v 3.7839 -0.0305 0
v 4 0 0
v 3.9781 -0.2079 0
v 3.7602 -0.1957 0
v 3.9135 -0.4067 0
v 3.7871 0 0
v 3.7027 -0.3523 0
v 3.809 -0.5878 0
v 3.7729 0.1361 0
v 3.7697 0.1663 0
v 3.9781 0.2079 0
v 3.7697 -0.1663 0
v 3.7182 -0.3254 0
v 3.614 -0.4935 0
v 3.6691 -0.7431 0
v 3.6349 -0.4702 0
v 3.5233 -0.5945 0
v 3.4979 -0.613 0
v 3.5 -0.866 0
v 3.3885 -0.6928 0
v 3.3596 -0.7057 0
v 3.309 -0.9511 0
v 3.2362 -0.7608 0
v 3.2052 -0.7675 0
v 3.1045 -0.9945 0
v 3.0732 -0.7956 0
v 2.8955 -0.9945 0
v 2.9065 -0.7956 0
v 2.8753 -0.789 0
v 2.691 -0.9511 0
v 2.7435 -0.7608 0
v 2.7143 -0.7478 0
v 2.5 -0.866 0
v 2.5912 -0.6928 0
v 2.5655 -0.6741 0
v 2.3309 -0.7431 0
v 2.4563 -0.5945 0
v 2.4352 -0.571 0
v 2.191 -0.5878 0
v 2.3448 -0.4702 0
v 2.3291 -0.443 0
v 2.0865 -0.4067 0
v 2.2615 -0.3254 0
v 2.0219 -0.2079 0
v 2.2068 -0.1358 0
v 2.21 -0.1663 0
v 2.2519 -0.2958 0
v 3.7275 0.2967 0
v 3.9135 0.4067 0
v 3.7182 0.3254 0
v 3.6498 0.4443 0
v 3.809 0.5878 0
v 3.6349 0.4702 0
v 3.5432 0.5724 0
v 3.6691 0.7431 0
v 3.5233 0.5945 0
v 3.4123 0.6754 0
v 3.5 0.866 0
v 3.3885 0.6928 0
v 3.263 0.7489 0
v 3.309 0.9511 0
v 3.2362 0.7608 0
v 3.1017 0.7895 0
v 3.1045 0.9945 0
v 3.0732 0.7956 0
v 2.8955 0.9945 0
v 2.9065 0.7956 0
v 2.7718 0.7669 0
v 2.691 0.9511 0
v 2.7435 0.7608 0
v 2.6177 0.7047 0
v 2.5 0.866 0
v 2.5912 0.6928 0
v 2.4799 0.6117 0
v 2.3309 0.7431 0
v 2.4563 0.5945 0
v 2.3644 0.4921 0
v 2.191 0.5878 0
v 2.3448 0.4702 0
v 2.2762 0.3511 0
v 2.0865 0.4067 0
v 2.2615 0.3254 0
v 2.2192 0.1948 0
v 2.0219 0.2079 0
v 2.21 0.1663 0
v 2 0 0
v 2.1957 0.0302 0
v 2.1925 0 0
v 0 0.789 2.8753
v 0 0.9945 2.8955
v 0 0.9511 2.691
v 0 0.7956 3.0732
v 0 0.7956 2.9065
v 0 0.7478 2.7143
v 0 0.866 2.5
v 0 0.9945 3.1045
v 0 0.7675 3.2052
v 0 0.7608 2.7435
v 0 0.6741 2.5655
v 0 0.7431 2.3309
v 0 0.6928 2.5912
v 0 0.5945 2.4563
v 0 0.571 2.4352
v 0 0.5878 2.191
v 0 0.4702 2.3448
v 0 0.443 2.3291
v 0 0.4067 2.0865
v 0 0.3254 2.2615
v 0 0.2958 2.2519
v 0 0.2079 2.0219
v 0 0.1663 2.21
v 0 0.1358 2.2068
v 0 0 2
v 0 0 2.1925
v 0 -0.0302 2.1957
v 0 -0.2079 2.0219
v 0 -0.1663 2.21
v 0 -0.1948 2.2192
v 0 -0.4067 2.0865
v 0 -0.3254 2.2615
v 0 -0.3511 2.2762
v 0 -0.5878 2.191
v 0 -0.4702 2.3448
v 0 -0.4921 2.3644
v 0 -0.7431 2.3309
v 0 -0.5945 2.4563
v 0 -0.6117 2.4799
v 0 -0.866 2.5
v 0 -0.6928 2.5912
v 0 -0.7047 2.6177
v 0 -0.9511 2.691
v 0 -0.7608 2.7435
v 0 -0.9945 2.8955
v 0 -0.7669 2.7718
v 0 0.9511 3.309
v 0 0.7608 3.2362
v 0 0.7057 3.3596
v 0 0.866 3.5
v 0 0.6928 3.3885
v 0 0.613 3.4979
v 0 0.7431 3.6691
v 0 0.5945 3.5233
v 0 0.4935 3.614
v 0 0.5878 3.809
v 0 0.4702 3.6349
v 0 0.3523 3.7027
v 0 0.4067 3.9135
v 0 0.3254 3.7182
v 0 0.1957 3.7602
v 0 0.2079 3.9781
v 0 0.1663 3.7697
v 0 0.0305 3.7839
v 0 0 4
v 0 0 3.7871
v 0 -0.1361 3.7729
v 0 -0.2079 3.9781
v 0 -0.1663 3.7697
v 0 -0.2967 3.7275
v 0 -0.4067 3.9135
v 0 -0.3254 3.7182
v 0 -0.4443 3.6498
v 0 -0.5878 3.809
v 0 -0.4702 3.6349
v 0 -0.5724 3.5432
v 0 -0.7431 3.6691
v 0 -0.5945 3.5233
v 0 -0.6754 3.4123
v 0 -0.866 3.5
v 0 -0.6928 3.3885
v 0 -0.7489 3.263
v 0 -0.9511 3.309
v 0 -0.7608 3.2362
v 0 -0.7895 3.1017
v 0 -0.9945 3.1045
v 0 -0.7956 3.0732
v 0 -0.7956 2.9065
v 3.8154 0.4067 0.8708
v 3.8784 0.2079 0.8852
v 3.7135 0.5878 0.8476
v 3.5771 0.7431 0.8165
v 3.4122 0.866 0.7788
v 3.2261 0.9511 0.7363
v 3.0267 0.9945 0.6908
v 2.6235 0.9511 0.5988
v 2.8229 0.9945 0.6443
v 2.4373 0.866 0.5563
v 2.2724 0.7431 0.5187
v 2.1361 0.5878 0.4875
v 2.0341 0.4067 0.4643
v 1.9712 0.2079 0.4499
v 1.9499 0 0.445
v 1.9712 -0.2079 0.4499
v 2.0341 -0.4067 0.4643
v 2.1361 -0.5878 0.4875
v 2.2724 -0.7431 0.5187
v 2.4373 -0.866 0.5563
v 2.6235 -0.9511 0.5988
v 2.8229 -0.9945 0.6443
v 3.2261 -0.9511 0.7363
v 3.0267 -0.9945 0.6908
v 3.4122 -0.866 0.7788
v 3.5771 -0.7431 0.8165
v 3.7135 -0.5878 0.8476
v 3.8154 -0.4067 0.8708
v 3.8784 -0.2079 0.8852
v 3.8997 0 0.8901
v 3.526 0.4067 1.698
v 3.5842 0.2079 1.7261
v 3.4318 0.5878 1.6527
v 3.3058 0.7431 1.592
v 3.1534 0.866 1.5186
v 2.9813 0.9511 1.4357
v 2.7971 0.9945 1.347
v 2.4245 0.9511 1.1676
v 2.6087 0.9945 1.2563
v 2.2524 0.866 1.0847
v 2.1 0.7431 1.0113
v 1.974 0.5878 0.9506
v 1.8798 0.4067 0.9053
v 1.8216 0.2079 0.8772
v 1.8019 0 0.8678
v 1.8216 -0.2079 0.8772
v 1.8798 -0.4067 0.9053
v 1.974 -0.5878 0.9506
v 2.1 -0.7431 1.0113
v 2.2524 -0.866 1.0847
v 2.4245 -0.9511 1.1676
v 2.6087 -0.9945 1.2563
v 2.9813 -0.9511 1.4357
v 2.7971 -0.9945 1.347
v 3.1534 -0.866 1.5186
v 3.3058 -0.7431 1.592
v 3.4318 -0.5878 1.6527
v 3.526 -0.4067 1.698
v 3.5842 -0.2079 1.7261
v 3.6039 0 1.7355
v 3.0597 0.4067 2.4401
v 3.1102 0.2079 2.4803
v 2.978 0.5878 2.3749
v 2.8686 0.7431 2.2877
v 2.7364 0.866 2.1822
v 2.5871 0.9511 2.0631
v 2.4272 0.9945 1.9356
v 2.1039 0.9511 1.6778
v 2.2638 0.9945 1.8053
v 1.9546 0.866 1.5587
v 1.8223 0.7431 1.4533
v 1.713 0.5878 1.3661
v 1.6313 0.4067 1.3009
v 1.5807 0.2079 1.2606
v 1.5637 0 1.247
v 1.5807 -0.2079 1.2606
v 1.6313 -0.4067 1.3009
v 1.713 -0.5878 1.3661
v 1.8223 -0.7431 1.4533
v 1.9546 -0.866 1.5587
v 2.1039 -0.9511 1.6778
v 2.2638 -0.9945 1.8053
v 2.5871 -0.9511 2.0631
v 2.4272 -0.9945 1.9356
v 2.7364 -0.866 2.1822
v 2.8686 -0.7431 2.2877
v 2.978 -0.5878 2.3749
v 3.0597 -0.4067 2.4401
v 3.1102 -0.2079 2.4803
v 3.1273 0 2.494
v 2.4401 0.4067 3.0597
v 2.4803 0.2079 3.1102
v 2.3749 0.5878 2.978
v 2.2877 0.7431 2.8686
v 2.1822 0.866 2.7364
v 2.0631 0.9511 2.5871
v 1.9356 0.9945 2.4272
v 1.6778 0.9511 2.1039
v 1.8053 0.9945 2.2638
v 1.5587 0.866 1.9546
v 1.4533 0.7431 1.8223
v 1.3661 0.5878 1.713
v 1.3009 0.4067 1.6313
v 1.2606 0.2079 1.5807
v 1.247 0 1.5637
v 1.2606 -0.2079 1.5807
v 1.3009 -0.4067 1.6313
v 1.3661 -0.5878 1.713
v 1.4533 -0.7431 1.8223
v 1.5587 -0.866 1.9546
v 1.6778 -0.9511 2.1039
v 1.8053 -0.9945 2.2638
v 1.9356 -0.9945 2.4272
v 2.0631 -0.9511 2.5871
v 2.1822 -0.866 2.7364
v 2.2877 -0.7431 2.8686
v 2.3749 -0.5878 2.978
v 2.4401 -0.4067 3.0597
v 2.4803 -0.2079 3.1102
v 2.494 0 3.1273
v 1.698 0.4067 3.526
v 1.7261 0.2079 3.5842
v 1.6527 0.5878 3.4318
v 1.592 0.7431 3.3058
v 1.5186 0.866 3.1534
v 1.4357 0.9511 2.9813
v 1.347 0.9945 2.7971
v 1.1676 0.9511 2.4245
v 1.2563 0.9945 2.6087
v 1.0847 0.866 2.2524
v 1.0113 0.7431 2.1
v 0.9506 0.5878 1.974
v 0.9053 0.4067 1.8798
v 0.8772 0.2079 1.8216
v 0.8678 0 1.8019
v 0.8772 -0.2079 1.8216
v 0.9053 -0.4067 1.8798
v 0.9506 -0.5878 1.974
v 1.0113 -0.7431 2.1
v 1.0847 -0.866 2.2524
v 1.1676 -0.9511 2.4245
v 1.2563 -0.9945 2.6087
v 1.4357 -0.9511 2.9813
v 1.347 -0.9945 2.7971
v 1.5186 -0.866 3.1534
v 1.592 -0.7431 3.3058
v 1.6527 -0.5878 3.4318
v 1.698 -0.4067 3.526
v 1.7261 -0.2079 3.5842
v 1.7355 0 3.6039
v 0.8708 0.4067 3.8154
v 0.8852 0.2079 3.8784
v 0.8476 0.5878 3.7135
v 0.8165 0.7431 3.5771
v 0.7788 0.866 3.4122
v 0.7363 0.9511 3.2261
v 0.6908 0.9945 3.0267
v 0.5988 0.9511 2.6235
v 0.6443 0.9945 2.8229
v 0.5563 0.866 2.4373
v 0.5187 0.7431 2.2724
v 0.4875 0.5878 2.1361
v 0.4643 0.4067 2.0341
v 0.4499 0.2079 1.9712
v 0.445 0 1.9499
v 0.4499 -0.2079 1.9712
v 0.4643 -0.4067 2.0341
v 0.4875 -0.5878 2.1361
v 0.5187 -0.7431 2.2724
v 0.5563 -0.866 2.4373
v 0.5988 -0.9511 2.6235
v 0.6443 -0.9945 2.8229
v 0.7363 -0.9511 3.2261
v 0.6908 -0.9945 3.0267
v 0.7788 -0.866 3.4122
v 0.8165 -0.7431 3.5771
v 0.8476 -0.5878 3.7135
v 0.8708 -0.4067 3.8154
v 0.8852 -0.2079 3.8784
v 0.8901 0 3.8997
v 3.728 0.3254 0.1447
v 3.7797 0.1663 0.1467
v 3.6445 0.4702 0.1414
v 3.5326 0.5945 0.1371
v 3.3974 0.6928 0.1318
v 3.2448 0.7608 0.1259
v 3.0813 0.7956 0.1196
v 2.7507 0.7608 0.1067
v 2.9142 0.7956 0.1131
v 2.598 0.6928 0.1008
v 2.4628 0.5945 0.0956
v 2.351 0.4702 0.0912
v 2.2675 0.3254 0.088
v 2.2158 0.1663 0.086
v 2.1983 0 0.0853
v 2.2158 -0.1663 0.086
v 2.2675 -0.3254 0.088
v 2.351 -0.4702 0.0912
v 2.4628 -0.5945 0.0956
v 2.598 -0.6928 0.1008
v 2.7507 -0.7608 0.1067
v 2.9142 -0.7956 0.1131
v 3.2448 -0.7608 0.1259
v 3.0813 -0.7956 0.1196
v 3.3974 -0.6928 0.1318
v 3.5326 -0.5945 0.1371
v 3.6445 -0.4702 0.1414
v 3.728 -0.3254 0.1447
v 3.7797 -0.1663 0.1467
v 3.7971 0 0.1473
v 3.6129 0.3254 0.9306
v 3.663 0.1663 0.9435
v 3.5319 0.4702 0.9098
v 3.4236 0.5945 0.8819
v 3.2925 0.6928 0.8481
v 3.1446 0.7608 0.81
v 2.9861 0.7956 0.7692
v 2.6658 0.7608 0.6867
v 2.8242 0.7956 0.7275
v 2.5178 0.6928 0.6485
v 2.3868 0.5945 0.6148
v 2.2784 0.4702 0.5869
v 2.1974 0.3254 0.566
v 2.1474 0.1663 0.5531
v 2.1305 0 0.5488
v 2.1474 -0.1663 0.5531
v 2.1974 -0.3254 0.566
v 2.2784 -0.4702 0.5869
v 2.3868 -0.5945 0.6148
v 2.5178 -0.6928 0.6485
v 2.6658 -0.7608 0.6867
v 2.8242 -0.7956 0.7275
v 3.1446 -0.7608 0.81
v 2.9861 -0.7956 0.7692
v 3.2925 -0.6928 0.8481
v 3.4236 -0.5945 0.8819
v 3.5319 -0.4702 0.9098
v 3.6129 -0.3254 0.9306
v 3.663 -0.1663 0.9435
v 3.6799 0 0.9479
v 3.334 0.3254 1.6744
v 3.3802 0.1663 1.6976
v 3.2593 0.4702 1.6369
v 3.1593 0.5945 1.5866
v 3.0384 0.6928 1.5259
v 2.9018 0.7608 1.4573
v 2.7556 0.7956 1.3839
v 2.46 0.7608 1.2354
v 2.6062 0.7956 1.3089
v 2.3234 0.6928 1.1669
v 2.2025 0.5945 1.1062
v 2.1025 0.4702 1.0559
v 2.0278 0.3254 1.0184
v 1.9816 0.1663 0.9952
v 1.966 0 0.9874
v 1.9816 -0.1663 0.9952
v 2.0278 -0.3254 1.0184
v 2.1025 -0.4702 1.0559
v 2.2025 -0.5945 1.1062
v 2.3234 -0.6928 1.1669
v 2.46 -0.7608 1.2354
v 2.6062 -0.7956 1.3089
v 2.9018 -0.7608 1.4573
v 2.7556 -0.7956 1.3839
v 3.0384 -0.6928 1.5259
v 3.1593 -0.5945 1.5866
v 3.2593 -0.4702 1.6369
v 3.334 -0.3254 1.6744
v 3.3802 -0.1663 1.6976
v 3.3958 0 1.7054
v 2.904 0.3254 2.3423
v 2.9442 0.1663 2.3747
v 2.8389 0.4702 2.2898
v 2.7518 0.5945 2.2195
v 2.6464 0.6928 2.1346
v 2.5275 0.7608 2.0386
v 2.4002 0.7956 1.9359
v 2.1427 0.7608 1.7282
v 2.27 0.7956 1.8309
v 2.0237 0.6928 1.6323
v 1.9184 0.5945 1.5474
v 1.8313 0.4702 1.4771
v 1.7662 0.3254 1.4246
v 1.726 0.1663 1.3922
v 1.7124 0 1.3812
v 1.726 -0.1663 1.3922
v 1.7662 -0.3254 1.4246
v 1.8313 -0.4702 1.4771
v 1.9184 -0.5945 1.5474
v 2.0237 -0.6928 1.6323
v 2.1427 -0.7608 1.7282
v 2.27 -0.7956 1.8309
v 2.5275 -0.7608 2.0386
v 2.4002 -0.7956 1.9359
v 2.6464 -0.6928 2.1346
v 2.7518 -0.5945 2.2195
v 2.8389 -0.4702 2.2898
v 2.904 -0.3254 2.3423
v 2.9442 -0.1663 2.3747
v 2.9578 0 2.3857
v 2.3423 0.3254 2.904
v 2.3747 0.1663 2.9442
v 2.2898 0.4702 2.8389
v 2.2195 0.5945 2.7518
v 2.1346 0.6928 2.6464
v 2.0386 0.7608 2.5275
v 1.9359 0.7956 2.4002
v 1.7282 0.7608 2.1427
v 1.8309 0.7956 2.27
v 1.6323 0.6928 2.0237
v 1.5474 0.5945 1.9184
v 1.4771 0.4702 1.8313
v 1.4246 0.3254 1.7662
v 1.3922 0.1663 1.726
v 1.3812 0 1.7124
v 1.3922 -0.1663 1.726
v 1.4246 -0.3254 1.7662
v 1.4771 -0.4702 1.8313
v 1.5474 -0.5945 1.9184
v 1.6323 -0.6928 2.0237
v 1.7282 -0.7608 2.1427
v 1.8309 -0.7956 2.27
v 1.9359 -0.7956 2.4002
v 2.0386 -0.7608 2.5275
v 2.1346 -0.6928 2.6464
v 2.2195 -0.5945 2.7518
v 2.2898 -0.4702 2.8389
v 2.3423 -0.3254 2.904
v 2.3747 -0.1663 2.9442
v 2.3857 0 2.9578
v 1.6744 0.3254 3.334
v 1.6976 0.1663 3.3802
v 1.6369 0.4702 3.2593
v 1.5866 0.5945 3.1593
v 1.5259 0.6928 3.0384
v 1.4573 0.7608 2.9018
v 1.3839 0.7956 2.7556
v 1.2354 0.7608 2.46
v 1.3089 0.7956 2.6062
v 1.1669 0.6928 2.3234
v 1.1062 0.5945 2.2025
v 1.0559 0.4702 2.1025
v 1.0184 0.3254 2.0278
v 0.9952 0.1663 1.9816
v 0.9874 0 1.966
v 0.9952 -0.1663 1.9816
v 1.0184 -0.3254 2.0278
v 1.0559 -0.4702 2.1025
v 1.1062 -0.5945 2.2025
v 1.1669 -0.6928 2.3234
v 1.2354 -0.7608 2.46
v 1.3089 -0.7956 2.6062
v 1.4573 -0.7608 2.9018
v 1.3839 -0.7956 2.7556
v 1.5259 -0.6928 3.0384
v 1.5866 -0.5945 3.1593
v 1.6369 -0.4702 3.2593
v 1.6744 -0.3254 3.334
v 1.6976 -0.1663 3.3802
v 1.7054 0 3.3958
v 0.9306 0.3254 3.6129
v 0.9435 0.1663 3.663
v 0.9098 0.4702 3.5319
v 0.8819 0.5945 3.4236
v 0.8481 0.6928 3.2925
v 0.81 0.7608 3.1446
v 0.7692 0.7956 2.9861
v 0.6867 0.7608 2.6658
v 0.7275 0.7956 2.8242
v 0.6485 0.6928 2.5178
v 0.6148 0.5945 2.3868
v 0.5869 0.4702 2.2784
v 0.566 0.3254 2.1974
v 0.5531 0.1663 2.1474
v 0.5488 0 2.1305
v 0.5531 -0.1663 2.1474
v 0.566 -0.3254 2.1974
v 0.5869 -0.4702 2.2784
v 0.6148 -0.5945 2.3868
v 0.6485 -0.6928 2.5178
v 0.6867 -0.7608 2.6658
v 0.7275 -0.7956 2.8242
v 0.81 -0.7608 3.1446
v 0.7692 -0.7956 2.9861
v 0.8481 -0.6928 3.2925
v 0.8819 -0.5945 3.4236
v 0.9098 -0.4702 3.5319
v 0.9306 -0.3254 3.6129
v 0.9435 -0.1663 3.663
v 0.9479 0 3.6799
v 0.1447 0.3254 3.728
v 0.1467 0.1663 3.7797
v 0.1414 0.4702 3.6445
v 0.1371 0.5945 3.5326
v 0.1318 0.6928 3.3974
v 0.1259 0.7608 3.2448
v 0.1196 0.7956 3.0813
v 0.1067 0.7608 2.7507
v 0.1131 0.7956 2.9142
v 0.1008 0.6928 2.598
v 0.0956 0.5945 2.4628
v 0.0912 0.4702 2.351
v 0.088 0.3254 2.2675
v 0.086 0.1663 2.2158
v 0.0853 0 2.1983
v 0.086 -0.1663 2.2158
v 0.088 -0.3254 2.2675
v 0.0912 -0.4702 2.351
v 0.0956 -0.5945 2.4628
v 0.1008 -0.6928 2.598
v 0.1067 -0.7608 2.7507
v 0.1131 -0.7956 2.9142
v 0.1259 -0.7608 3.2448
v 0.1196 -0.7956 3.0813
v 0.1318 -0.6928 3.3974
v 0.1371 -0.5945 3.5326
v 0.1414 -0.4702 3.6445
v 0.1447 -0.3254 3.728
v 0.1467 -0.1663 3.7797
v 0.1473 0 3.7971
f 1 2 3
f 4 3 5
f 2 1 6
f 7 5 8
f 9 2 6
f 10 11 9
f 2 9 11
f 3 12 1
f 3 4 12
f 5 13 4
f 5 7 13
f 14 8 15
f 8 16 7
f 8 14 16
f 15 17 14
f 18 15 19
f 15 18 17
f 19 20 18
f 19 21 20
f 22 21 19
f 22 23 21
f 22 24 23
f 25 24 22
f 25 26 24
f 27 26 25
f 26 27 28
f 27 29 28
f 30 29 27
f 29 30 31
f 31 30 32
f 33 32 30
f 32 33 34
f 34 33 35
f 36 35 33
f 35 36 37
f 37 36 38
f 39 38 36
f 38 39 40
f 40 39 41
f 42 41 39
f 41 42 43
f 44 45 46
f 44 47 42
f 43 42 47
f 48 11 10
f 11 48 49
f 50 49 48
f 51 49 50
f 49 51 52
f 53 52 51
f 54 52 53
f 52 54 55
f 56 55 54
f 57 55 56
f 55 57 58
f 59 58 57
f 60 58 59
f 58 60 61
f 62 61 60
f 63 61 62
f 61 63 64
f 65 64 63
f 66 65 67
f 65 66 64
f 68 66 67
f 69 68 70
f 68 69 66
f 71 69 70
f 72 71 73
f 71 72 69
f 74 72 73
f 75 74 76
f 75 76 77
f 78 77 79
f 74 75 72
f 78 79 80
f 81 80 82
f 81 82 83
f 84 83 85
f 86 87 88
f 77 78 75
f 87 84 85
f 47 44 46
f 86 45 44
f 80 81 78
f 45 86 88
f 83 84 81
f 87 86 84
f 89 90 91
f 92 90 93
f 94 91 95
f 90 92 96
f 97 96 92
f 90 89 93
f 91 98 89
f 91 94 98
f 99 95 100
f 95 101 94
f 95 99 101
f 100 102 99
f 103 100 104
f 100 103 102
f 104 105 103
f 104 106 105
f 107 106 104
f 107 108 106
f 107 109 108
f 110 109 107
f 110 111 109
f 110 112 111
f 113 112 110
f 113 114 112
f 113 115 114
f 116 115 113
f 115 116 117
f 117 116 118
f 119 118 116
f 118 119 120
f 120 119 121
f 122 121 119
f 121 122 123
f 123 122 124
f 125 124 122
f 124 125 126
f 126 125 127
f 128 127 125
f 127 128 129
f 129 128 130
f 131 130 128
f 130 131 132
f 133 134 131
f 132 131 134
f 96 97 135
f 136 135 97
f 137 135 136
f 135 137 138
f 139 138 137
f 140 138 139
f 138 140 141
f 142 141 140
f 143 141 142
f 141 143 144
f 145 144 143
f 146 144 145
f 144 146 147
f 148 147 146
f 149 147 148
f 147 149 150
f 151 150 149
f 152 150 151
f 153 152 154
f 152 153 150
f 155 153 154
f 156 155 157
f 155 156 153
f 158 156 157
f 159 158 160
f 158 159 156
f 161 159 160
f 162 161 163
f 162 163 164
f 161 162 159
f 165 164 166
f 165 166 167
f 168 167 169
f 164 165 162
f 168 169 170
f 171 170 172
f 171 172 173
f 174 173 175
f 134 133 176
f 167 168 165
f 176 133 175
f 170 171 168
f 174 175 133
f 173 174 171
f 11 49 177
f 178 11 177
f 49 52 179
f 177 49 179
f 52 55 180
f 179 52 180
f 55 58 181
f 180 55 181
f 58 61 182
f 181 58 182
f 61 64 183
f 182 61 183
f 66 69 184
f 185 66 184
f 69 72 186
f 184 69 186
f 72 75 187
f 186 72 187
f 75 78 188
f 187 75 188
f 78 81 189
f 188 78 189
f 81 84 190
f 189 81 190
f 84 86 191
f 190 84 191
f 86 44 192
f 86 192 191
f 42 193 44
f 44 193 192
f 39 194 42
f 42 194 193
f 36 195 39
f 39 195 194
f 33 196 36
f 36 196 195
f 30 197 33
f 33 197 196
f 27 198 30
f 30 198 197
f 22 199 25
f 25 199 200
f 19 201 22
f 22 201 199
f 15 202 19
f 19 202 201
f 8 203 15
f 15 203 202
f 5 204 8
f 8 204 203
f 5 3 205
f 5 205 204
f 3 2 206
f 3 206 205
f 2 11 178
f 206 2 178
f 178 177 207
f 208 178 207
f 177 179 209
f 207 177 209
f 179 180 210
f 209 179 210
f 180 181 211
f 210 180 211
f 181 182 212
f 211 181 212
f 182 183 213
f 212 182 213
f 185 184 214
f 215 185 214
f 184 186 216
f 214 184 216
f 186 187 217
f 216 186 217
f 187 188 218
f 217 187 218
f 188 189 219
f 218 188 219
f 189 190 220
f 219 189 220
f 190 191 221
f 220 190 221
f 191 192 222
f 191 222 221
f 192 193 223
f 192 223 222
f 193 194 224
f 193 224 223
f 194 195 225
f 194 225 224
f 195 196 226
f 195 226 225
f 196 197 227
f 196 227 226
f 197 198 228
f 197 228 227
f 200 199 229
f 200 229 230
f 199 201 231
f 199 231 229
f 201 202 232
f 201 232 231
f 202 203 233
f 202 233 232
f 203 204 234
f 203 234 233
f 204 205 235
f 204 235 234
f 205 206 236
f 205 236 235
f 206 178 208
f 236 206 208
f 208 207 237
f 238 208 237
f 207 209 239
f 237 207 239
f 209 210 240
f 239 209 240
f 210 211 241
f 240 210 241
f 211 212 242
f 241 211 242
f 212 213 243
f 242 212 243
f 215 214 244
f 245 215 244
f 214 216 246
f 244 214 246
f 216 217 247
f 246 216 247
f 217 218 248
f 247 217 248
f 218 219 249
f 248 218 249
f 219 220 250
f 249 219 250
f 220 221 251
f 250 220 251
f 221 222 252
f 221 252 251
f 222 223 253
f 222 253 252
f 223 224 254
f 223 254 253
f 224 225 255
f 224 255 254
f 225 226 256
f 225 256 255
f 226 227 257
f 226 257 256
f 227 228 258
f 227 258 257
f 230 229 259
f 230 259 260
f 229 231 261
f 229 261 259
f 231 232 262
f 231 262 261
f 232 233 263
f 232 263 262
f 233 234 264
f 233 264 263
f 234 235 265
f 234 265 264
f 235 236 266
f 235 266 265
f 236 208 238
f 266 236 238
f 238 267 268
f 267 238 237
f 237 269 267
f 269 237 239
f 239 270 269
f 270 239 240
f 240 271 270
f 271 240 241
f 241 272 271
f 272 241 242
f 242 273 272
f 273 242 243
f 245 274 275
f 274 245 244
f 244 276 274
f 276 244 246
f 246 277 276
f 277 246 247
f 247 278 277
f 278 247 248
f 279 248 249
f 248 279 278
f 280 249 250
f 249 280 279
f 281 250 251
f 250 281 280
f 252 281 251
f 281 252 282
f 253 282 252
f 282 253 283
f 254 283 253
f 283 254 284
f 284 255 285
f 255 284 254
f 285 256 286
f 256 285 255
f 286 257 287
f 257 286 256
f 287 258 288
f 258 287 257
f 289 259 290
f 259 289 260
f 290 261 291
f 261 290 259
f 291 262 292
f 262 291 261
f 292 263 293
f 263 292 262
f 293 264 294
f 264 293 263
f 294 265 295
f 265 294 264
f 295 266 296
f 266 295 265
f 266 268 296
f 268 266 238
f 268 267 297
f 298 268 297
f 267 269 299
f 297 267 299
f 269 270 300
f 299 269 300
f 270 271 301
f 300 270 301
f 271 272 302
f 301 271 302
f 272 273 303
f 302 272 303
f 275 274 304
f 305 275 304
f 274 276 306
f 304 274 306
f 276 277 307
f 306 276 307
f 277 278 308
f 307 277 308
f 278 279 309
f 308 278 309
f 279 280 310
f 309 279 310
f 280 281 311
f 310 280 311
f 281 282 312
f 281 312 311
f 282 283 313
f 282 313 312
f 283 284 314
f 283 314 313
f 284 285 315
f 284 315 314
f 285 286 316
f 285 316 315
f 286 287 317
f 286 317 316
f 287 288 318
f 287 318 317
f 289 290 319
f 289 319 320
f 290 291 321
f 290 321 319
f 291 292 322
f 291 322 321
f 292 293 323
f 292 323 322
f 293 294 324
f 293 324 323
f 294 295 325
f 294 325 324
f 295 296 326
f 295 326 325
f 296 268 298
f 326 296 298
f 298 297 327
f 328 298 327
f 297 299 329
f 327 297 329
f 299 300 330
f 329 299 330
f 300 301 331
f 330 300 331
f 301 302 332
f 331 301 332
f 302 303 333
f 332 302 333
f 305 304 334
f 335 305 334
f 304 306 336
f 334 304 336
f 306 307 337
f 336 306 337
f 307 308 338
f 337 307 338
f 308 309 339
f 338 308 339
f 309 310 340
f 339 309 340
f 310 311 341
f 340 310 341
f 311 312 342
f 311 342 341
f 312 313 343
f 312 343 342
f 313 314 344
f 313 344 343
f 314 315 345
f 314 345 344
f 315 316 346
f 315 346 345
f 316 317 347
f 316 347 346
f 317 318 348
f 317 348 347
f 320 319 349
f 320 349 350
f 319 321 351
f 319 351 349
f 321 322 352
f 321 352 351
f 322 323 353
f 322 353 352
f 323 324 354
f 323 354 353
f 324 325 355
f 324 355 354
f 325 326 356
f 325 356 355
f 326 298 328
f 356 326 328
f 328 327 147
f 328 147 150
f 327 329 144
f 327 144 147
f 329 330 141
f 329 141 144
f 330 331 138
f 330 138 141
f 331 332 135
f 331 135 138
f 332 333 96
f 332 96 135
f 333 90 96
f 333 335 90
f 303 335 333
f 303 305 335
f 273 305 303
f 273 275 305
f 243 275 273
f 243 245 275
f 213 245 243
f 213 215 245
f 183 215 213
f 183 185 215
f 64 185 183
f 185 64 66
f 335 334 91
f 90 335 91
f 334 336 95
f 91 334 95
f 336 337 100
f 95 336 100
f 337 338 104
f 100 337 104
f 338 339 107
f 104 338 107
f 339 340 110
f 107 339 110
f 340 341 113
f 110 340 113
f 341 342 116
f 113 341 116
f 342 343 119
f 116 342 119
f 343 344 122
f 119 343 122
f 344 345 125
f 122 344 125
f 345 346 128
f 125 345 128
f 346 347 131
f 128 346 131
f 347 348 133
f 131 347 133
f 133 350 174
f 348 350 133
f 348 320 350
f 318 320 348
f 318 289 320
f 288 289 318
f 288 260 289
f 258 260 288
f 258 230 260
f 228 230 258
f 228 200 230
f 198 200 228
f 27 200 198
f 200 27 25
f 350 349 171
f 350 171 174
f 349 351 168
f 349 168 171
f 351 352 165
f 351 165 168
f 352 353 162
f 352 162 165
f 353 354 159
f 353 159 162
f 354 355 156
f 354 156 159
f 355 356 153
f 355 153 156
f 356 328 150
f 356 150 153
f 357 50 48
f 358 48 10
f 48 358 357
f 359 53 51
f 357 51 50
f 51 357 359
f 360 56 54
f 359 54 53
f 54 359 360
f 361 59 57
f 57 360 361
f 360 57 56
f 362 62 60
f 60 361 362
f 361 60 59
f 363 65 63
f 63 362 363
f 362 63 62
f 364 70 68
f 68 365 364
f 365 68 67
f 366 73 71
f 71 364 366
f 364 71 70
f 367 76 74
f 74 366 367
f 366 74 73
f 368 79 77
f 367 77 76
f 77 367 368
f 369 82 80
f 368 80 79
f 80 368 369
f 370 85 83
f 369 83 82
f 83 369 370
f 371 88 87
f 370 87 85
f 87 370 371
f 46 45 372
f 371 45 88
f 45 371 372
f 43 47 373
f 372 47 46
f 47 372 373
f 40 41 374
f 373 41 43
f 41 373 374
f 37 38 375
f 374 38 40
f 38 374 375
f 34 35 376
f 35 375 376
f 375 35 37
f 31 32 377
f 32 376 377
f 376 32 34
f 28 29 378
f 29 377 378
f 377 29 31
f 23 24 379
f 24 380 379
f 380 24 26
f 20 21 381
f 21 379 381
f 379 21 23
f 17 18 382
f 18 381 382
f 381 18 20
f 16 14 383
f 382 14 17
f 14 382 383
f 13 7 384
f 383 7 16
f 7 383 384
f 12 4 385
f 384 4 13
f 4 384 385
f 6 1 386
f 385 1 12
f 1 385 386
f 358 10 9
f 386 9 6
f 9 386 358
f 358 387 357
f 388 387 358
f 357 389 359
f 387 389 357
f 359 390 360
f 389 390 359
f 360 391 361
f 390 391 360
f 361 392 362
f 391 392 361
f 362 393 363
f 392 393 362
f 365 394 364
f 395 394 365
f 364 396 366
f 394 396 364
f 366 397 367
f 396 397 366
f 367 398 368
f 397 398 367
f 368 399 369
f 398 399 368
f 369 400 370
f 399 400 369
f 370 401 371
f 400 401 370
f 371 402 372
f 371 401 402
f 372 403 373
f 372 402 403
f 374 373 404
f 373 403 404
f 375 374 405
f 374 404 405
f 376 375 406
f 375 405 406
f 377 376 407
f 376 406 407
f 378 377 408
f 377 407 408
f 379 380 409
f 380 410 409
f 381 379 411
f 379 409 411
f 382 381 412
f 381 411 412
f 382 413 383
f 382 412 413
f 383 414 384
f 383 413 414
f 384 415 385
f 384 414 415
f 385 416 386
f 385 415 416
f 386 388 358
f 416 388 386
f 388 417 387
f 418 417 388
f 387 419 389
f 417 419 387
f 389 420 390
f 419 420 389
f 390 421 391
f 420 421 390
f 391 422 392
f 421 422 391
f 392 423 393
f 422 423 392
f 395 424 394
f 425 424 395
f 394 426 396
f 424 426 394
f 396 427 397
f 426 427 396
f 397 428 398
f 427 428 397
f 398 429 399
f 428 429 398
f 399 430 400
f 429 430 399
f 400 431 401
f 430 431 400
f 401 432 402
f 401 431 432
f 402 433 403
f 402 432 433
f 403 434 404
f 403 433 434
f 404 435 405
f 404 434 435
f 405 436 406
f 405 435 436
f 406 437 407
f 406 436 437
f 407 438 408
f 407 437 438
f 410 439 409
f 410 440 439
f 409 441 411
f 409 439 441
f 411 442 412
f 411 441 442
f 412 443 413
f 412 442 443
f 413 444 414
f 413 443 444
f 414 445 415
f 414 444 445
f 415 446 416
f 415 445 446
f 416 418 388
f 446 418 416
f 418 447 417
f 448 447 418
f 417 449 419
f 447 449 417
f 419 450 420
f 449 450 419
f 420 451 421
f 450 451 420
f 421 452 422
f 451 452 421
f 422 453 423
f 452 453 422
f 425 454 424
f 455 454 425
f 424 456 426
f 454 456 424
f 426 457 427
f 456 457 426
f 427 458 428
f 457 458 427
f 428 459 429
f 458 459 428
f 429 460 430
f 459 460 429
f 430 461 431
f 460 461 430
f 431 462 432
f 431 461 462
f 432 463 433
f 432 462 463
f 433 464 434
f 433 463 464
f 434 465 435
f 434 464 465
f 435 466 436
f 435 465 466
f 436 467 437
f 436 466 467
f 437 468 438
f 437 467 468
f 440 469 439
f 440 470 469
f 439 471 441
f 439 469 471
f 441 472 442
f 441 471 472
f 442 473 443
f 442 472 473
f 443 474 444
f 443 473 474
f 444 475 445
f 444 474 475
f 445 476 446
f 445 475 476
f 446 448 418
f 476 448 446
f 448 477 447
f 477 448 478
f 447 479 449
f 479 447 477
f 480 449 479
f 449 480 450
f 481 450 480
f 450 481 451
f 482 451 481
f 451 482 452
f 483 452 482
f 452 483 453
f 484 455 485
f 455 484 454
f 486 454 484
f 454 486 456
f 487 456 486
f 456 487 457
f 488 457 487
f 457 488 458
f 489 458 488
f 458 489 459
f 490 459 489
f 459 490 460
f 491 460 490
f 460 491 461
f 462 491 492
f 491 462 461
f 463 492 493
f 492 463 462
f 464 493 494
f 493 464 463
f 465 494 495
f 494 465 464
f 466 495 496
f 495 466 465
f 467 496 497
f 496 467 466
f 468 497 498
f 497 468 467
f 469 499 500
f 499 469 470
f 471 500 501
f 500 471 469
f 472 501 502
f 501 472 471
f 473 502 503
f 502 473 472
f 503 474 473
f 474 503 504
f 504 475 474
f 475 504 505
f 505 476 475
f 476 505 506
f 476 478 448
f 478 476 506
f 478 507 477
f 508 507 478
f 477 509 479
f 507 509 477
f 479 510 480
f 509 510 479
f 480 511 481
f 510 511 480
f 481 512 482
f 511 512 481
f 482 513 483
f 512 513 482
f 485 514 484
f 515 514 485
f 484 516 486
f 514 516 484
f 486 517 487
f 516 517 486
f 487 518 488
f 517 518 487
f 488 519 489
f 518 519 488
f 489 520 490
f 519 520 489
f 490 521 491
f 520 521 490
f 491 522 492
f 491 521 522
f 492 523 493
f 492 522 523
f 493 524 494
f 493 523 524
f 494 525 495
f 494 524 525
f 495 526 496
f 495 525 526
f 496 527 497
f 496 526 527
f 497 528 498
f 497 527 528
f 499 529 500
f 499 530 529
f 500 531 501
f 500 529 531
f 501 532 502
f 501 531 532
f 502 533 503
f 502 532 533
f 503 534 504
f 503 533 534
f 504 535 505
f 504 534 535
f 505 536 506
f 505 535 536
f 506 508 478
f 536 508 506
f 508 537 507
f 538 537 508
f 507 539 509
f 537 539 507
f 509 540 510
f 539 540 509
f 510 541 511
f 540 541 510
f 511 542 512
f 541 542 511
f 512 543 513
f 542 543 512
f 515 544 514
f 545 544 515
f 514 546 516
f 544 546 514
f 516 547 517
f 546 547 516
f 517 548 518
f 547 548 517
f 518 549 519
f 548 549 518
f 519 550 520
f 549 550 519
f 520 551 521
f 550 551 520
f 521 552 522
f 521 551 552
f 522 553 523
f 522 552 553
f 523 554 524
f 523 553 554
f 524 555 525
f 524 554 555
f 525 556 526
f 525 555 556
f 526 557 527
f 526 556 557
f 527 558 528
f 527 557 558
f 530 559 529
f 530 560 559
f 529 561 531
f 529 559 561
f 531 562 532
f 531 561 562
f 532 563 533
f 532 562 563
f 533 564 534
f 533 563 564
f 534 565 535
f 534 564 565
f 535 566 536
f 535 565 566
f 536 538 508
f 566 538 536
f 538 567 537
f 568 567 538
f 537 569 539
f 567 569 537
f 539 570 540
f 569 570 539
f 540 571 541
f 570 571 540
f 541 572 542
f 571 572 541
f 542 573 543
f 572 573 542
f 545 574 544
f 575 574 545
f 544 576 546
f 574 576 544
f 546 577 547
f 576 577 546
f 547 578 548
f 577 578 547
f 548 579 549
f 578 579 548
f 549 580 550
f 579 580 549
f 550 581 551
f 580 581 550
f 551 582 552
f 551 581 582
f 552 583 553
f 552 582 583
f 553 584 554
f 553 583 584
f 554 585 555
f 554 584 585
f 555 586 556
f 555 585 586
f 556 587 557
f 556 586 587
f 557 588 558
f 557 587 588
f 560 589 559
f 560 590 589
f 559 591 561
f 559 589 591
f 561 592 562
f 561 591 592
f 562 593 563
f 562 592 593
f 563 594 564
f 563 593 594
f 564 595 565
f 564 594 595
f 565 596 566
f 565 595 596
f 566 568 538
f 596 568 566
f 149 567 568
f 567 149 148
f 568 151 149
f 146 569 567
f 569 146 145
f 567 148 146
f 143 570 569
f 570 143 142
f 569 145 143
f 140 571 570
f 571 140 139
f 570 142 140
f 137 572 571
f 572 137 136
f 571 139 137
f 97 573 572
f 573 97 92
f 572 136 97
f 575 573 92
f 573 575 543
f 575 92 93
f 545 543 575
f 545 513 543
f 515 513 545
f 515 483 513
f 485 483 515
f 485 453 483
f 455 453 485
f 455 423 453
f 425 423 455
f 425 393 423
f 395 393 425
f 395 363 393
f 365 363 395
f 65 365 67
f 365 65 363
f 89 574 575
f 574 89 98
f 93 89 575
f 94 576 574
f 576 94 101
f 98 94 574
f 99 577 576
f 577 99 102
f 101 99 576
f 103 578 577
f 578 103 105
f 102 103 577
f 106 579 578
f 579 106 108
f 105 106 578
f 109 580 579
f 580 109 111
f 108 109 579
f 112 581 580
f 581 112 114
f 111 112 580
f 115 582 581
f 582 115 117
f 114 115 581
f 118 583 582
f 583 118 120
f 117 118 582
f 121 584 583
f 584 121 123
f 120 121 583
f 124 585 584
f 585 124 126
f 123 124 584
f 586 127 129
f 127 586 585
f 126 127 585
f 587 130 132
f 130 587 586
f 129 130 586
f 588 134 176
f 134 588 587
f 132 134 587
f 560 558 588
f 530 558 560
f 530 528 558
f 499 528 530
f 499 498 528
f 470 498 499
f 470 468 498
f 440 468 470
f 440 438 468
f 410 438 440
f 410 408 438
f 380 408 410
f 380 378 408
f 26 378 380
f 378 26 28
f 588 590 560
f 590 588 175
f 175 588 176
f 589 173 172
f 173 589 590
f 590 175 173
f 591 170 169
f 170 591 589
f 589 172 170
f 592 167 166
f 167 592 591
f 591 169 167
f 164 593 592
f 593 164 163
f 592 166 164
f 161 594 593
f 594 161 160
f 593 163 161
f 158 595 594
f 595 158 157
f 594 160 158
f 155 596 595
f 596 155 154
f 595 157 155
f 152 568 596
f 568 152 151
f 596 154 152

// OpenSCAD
// Nicolì Angelo 2023 - THIS CODE IS LICENSED AS GPL-2.0

module pipe(raggio,angolo){
color("#a8b0b2")
rotate([90,0,0])
rotate_extrude(angle=angolo, $fn = $preview? 90: 30) 
translate([3, 0, 0])
circle(r = raggio, $fn = $preview? 90: 30);
}

difference(){
   translate([0,0])
   pipe(1,90);
   
   rotate([0,10,0])
   translate([0,0])
   pipe(0.8,110);
 }


module repeat(){
difference(){
 for (i =[-1:1]){
     translate([0,5*i,0])
     ring(1,90);
 }
 
 for (i =[-1:1]){
    rotate([0,10,0])
     translate([0,5*i,0])
     ring(0.8,110);
 }
 
}
}
